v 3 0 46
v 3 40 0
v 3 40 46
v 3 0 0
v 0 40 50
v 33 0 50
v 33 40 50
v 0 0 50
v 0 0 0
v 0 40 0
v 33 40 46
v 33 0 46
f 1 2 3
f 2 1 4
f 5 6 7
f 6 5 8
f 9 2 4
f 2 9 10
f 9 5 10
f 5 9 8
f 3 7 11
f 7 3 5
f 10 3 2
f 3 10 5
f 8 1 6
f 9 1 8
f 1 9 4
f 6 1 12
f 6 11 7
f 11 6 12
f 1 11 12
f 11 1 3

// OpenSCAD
// A wall bracket with a horizontal shelf: the underside of the shelf is a 90-degree
// overhang over nothing, which is exactly what the DFM check should report.
wall_t   = 3;
shelf_t  = 4;
width    = 40;
height   = 50;
depth    = 30;

union() {
    cube([wall_t, width, height]);
    translate([wall_t, 0, height - shelf_t])
        cube([depth, width, shelf_t]);
}
